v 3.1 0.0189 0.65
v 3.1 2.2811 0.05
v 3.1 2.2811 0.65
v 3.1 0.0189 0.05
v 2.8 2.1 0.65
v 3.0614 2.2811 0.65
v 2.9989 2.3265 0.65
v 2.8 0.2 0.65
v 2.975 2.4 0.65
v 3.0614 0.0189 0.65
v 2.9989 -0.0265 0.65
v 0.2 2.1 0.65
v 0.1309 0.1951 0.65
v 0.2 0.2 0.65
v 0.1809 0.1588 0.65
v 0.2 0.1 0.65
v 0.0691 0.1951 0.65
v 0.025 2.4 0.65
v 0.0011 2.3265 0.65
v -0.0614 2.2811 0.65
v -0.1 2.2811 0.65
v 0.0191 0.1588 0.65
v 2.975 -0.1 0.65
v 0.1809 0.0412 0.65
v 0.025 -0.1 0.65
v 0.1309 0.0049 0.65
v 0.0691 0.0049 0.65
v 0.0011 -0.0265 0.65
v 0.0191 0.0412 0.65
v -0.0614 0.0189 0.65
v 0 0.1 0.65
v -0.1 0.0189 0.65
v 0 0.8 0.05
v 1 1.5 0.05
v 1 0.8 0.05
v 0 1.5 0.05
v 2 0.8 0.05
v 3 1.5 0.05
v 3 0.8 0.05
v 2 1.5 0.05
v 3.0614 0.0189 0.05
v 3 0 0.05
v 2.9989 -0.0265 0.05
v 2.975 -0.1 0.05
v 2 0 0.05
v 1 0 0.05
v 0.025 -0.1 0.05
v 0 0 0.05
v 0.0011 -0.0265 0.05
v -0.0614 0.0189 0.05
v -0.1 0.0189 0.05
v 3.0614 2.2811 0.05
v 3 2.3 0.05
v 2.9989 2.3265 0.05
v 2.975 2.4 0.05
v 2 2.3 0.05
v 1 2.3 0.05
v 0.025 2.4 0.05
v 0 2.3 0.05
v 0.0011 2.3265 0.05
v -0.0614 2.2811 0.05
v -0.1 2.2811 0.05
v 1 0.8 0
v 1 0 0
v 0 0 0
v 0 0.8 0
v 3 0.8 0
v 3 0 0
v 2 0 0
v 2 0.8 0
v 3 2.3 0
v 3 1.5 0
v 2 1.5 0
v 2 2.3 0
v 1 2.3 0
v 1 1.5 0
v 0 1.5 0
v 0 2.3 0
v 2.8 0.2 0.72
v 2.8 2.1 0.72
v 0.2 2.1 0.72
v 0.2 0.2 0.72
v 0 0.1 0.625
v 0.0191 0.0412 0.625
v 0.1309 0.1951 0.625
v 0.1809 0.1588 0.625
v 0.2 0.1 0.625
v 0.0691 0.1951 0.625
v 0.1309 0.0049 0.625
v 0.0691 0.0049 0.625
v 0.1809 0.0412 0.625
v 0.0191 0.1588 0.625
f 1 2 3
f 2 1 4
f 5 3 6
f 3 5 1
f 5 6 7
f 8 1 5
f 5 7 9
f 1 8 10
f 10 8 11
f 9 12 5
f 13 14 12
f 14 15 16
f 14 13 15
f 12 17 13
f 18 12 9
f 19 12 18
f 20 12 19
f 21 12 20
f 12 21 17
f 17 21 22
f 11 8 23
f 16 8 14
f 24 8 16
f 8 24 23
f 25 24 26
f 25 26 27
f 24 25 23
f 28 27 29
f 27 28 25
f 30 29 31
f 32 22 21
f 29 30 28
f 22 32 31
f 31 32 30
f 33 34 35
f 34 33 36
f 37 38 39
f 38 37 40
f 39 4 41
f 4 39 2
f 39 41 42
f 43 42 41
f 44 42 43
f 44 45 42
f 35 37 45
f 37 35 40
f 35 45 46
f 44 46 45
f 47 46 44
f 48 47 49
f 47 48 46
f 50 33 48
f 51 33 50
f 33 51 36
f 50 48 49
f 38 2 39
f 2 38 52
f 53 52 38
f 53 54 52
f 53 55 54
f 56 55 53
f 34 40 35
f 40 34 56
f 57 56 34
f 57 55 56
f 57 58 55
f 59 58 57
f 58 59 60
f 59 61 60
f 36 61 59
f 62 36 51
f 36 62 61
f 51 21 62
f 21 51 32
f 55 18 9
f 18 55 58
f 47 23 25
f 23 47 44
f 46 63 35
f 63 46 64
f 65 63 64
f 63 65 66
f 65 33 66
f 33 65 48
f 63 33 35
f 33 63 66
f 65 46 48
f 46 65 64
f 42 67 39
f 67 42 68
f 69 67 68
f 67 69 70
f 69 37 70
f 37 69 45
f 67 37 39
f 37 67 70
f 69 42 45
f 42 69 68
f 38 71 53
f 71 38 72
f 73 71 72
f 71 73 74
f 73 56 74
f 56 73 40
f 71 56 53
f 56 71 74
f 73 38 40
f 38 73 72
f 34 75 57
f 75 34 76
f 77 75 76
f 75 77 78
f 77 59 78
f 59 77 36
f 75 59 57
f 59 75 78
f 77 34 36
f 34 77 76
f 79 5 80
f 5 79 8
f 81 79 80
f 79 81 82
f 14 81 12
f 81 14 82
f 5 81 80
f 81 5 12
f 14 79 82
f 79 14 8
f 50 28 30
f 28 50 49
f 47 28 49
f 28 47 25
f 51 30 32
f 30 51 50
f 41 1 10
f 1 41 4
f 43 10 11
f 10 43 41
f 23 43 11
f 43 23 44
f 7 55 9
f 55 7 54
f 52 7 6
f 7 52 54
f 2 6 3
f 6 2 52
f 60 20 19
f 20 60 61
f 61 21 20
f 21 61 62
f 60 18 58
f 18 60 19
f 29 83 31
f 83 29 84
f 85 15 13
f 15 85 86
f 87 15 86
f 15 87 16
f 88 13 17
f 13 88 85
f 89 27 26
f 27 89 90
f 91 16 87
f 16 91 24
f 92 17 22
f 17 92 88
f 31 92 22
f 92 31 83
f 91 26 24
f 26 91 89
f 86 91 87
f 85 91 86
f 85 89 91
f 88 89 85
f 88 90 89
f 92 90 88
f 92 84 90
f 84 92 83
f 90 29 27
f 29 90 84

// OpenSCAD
pin_x = 1;
pin_y = 0.8;
pin_z = 0.05;

case_x = 3.2;
case_y = 2.5;
case_z = 0.6;
case_top_diff = 0.6;
case_top_size_z = 0.07;

difference (){
    
    difference(){
        
        union(){
            // case
            translate([-0.1,-0.1,pin_z])
                cube(size=[case_x,case_y,case_z], center = false);
            // pins
            cube(size = [pin_x,pin_y,pin_z], center=false);
            translate([2,0,0])
                cube(size = [pin_x,pin_y,pin_z], center=false);
            translate([2,1.5,0])
                cube(size = [pin_x,pin_y,pin_z], center=false);
            translate([0,1.5,0])
                cube(size = [pin_x,pin_y,pin_z], center=false);
            // top
            translate([-0.1+case_top_diff/2,-0.1+case_top_diff/2,pin_z+case_z])
                cube(size=[case_x-case_top_diff,case_y-case_top_diff,case_top_size_z], center = false);
        }
        
        union(){
            translate([-0.1,-0.1,0])
                cylinder(h=1,d=0.25,center=false, $fn = 10);
            translate([-0.1+case_x,-0.1,0])
                cylinder(h=1,d=0.25,center=false, $fn = 10);
            translate([-0.1+case_x,-0.1+case_y,0])
                cylinder(h=1,d=0.25,center=false, $fn = 10);
            translate([-0.1,-0.1+case_y,0])
                cylinder(h=1,d=0.25,center=false, $fn = 10);
        }
        
    };
    
    translate([-0.1+0.2,-0.1+0.2,case_z+pin_z/2])
        cylinder (h=pin_z,d=0.2,center = false, $fn = 10);
}
